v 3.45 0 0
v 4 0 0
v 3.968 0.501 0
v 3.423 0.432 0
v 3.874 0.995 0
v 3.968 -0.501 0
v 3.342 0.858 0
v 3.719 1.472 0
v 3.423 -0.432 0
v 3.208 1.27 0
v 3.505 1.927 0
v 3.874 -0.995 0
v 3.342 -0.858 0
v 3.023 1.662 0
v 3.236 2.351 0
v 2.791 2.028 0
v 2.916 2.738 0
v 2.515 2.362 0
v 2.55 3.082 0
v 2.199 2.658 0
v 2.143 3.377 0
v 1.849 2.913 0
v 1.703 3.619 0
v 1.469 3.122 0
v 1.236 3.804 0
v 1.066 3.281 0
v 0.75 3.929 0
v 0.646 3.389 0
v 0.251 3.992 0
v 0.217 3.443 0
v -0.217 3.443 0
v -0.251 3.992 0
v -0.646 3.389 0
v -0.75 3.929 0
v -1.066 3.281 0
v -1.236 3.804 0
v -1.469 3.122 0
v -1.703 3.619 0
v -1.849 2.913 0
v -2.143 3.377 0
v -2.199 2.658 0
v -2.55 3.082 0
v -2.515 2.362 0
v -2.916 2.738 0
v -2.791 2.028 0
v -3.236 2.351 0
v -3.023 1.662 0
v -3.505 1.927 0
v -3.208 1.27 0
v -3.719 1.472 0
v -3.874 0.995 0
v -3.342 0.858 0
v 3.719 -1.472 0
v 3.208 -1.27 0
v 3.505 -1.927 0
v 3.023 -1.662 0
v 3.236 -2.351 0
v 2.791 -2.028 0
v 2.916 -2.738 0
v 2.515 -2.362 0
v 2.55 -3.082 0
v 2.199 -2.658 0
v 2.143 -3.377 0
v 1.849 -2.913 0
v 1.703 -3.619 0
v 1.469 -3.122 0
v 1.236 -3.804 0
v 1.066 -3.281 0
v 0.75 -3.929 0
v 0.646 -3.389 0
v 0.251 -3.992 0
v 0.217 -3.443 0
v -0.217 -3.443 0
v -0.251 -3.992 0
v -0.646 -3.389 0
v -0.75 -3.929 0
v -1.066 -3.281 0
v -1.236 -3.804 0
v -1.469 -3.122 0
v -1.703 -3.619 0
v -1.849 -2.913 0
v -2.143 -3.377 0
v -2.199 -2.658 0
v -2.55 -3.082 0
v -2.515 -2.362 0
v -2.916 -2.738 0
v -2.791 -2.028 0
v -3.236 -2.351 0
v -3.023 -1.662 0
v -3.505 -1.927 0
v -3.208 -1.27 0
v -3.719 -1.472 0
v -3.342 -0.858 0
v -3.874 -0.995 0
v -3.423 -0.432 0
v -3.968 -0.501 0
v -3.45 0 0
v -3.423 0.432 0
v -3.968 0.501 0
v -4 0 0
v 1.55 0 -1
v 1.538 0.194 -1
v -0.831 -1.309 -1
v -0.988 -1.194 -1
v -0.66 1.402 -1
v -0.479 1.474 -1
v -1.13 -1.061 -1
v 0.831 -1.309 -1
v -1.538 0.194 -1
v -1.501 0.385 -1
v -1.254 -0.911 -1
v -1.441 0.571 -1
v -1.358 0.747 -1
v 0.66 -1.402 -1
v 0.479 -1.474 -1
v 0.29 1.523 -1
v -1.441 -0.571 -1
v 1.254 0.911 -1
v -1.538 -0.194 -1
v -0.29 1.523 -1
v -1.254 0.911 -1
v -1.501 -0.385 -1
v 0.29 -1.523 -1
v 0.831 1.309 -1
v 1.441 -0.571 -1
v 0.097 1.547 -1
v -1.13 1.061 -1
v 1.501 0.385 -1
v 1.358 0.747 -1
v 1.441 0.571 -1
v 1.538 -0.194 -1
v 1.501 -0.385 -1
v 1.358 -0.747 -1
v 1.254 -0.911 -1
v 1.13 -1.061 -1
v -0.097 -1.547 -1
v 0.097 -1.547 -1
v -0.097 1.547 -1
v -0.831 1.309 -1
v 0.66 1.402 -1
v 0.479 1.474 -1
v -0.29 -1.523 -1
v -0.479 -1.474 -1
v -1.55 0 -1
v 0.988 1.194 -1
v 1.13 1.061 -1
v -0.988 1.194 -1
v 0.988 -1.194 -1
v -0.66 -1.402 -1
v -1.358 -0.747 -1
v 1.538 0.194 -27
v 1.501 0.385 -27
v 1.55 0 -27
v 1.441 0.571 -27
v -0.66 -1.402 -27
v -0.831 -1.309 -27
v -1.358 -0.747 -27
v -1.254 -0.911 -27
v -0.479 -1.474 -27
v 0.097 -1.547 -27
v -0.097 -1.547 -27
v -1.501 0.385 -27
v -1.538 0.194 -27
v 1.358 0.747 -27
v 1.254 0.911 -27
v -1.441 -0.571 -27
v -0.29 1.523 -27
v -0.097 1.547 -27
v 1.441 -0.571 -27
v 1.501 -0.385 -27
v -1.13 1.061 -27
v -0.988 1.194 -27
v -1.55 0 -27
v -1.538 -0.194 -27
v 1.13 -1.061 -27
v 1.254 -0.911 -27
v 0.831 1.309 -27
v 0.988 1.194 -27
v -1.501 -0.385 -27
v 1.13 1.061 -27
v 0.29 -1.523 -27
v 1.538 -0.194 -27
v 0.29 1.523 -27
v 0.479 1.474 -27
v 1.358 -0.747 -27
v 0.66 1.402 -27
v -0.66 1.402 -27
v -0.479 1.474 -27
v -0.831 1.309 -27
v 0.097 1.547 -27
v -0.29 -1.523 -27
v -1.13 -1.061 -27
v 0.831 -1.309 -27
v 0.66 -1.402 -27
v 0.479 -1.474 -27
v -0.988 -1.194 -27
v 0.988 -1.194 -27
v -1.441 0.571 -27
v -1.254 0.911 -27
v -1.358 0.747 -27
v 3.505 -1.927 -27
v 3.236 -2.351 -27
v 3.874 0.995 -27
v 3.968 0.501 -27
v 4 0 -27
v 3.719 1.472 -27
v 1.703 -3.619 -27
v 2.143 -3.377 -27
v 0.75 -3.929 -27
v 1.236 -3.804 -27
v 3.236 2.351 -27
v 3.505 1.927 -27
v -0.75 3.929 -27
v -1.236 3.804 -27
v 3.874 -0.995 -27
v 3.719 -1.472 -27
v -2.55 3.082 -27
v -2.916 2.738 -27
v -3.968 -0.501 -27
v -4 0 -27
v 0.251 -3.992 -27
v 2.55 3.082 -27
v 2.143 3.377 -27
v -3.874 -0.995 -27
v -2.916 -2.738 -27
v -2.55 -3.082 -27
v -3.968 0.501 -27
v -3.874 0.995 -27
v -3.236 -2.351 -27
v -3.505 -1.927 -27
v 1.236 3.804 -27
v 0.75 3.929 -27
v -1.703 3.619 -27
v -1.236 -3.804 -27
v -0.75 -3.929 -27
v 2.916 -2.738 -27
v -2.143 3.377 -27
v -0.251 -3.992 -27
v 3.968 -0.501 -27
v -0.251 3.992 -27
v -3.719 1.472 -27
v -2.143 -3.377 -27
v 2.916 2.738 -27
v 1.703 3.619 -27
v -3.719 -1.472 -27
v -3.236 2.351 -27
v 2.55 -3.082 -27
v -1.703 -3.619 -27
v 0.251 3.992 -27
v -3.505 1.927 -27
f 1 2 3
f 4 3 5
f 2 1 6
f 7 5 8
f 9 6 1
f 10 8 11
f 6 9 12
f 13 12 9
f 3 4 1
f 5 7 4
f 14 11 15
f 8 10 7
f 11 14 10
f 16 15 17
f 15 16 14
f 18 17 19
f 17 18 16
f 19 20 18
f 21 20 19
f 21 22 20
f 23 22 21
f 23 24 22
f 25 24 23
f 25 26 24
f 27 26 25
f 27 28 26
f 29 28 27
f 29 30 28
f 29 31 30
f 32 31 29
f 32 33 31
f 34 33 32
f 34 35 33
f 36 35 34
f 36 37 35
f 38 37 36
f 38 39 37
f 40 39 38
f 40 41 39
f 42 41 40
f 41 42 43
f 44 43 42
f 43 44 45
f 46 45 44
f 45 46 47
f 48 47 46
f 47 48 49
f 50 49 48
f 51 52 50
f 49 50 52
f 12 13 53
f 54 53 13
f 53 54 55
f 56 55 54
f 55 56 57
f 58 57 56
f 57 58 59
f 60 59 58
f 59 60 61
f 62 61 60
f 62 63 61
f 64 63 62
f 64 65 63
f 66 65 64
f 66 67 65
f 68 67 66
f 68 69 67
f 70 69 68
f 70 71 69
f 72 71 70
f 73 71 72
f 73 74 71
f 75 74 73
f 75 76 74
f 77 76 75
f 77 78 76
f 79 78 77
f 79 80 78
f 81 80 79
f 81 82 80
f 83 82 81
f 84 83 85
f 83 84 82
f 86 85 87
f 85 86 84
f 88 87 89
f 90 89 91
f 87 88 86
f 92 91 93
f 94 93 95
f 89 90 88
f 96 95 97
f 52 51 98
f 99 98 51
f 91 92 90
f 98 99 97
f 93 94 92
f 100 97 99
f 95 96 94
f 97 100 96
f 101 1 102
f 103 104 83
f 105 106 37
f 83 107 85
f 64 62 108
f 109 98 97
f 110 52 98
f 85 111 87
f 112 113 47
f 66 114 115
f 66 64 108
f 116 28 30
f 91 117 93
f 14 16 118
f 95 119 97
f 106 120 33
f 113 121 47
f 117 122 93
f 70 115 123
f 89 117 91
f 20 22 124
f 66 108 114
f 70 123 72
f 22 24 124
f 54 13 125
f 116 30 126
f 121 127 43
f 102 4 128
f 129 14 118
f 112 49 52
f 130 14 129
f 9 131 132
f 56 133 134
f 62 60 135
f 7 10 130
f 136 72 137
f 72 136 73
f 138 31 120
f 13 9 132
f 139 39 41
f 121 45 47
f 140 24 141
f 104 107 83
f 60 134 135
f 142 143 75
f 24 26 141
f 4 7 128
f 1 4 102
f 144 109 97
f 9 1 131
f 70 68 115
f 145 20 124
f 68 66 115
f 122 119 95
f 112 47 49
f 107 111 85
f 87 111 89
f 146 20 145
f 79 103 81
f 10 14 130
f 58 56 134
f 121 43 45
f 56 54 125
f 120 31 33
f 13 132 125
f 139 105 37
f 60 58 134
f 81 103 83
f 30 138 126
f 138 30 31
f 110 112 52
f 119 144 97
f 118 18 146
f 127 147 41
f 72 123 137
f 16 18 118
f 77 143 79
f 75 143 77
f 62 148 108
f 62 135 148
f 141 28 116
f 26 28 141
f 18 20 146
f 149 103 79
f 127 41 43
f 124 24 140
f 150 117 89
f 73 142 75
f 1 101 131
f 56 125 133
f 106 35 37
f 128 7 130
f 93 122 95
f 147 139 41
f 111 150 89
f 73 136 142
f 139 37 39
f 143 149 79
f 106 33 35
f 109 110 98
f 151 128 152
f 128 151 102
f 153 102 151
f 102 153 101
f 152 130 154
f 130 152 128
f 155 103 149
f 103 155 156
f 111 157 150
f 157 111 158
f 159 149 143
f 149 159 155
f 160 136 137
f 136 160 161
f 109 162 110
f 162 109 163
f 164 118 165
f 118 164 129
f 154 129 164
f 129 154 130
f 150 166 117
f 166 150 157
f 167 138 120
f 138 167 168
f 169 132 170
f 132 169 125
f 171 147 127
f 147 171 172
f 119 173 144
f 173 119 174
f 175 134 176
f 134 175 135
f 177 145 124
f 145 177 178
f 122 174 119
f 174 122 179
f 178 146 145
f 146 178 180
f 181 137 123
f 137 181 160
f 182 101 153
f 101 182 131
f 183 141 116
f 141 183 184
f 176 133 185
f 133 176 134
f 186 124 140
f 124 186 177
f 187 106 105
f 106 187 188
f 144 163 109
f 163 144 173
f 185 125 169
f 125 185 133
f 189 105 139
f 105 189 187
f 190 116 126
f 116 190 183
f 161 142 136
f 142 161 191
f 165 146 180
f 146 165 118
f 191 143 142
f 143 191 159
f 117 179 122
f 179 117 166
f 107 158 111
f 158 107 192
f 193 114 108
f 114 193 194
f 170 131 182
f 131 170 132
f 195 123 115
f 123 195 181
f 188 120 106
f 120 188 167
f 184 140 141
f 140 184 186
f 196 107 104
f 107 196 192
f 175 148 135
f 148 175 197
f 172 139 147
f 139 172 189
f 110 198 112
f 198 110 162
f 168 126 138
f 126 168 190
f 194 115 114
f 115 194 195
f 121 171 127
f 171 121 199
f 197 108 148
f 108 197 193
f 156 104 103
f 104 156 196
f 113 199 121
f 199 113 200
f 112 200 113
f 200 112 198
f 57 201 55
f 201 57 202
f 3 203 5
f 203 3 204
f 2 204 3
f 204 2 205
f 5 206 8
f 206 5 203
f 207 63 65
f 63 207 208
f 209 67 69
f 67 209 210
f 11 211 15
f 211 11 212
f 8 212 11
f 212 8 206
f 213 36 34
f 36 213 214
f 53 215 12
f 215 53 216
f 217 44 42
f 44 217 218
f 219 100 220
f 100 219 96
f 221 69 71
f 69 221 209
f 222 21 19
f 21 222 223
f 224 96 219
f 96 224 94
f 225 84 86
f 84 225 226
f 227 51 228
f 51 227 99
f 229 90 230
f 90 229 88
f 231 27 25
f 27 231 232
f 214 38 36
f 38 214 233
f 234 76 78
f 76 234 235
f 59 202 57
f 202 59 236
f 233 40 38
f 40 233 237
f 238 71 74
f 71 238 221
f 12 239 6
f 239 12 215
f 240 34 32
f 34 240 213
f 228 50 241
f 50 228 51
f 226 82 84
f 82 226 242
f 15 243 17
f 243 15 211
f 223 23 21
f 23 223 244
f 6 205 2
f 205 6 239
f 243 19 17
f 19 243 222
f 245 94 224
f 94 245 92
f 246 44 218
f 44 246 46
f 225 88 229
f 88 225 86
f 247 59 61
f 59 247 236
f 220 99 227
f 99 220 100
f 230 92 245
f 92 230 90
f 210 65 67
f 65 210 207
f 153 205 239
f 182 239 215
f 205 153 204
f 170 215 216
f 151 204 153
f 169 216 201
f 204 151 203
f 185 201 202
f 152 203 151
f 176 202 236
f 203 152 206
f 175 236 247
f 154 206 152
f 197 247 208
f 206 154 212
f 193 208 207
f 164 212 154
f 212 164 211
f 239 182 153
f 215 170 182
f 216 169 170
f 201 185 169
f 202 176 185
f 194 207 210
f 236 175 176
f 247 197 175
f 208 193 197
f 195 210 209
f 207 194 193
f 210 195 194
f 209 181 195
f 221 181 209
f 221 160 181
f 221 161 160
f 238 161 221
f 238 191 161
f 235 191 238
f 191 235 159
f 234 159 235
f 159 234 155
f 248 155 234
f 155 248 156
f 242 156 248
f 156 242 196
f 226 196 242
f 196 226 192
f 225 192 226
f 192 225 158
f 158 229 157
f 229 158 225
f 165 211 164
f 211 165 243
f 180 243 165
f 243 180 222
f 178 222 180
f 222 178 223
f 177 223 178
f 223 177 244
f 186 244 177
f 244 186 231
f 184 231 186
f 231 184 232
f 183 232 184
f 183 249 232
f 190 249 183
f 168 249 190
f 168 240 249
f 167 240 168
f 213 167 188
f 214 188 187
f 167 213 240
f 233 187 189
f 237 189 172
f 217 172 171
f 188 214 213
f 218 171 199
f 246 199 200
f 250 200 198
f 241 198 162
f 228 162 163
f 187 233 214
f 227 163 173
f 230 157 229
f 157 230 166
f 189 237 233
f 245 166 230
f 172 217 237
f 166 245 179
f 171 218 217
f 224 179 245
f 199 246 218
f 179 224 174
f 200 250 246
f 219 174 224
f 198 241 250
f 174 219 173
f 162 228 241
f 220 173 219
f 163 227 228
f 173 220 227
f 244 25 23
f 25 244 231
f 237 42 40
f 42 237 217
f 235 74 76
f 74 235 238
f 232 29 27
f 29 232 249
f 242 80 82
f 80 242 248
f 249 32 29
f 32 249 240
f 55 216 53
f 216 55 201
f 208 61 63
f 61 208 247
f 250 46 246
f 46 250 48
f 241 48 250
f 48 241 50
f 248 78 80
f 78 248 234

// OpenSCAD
$fn = 50;

difference() {
	union() {
		translate(v = [0, 0, -27.0]) {
			cylinder(h = 27, r = 4.0);
		}
	}
	union() {
		translate(v = [0, 0, 0]) {
			rotate(a = [0, 0, 0]) {
				difference() {
					union() {
						translate(v = [0, 0, -30.0]) {
							cylinder(h = 30, r = 1.25);
						}
						translate(v = [0, 0, -1.0]) {
							cylinder(h = 1.0, r1 = 1.55, r2 = 3.45);
						}
						translate(v = [0, 0, -30.0]) {
							cylinder(h = 30, r = 1.55);
						}
						translate(v = [0, 0, -30.0]) {
							cylinder(h = 30, r = 1.25);
						}
					}
					union();
				}
			}
		}
	}
}
